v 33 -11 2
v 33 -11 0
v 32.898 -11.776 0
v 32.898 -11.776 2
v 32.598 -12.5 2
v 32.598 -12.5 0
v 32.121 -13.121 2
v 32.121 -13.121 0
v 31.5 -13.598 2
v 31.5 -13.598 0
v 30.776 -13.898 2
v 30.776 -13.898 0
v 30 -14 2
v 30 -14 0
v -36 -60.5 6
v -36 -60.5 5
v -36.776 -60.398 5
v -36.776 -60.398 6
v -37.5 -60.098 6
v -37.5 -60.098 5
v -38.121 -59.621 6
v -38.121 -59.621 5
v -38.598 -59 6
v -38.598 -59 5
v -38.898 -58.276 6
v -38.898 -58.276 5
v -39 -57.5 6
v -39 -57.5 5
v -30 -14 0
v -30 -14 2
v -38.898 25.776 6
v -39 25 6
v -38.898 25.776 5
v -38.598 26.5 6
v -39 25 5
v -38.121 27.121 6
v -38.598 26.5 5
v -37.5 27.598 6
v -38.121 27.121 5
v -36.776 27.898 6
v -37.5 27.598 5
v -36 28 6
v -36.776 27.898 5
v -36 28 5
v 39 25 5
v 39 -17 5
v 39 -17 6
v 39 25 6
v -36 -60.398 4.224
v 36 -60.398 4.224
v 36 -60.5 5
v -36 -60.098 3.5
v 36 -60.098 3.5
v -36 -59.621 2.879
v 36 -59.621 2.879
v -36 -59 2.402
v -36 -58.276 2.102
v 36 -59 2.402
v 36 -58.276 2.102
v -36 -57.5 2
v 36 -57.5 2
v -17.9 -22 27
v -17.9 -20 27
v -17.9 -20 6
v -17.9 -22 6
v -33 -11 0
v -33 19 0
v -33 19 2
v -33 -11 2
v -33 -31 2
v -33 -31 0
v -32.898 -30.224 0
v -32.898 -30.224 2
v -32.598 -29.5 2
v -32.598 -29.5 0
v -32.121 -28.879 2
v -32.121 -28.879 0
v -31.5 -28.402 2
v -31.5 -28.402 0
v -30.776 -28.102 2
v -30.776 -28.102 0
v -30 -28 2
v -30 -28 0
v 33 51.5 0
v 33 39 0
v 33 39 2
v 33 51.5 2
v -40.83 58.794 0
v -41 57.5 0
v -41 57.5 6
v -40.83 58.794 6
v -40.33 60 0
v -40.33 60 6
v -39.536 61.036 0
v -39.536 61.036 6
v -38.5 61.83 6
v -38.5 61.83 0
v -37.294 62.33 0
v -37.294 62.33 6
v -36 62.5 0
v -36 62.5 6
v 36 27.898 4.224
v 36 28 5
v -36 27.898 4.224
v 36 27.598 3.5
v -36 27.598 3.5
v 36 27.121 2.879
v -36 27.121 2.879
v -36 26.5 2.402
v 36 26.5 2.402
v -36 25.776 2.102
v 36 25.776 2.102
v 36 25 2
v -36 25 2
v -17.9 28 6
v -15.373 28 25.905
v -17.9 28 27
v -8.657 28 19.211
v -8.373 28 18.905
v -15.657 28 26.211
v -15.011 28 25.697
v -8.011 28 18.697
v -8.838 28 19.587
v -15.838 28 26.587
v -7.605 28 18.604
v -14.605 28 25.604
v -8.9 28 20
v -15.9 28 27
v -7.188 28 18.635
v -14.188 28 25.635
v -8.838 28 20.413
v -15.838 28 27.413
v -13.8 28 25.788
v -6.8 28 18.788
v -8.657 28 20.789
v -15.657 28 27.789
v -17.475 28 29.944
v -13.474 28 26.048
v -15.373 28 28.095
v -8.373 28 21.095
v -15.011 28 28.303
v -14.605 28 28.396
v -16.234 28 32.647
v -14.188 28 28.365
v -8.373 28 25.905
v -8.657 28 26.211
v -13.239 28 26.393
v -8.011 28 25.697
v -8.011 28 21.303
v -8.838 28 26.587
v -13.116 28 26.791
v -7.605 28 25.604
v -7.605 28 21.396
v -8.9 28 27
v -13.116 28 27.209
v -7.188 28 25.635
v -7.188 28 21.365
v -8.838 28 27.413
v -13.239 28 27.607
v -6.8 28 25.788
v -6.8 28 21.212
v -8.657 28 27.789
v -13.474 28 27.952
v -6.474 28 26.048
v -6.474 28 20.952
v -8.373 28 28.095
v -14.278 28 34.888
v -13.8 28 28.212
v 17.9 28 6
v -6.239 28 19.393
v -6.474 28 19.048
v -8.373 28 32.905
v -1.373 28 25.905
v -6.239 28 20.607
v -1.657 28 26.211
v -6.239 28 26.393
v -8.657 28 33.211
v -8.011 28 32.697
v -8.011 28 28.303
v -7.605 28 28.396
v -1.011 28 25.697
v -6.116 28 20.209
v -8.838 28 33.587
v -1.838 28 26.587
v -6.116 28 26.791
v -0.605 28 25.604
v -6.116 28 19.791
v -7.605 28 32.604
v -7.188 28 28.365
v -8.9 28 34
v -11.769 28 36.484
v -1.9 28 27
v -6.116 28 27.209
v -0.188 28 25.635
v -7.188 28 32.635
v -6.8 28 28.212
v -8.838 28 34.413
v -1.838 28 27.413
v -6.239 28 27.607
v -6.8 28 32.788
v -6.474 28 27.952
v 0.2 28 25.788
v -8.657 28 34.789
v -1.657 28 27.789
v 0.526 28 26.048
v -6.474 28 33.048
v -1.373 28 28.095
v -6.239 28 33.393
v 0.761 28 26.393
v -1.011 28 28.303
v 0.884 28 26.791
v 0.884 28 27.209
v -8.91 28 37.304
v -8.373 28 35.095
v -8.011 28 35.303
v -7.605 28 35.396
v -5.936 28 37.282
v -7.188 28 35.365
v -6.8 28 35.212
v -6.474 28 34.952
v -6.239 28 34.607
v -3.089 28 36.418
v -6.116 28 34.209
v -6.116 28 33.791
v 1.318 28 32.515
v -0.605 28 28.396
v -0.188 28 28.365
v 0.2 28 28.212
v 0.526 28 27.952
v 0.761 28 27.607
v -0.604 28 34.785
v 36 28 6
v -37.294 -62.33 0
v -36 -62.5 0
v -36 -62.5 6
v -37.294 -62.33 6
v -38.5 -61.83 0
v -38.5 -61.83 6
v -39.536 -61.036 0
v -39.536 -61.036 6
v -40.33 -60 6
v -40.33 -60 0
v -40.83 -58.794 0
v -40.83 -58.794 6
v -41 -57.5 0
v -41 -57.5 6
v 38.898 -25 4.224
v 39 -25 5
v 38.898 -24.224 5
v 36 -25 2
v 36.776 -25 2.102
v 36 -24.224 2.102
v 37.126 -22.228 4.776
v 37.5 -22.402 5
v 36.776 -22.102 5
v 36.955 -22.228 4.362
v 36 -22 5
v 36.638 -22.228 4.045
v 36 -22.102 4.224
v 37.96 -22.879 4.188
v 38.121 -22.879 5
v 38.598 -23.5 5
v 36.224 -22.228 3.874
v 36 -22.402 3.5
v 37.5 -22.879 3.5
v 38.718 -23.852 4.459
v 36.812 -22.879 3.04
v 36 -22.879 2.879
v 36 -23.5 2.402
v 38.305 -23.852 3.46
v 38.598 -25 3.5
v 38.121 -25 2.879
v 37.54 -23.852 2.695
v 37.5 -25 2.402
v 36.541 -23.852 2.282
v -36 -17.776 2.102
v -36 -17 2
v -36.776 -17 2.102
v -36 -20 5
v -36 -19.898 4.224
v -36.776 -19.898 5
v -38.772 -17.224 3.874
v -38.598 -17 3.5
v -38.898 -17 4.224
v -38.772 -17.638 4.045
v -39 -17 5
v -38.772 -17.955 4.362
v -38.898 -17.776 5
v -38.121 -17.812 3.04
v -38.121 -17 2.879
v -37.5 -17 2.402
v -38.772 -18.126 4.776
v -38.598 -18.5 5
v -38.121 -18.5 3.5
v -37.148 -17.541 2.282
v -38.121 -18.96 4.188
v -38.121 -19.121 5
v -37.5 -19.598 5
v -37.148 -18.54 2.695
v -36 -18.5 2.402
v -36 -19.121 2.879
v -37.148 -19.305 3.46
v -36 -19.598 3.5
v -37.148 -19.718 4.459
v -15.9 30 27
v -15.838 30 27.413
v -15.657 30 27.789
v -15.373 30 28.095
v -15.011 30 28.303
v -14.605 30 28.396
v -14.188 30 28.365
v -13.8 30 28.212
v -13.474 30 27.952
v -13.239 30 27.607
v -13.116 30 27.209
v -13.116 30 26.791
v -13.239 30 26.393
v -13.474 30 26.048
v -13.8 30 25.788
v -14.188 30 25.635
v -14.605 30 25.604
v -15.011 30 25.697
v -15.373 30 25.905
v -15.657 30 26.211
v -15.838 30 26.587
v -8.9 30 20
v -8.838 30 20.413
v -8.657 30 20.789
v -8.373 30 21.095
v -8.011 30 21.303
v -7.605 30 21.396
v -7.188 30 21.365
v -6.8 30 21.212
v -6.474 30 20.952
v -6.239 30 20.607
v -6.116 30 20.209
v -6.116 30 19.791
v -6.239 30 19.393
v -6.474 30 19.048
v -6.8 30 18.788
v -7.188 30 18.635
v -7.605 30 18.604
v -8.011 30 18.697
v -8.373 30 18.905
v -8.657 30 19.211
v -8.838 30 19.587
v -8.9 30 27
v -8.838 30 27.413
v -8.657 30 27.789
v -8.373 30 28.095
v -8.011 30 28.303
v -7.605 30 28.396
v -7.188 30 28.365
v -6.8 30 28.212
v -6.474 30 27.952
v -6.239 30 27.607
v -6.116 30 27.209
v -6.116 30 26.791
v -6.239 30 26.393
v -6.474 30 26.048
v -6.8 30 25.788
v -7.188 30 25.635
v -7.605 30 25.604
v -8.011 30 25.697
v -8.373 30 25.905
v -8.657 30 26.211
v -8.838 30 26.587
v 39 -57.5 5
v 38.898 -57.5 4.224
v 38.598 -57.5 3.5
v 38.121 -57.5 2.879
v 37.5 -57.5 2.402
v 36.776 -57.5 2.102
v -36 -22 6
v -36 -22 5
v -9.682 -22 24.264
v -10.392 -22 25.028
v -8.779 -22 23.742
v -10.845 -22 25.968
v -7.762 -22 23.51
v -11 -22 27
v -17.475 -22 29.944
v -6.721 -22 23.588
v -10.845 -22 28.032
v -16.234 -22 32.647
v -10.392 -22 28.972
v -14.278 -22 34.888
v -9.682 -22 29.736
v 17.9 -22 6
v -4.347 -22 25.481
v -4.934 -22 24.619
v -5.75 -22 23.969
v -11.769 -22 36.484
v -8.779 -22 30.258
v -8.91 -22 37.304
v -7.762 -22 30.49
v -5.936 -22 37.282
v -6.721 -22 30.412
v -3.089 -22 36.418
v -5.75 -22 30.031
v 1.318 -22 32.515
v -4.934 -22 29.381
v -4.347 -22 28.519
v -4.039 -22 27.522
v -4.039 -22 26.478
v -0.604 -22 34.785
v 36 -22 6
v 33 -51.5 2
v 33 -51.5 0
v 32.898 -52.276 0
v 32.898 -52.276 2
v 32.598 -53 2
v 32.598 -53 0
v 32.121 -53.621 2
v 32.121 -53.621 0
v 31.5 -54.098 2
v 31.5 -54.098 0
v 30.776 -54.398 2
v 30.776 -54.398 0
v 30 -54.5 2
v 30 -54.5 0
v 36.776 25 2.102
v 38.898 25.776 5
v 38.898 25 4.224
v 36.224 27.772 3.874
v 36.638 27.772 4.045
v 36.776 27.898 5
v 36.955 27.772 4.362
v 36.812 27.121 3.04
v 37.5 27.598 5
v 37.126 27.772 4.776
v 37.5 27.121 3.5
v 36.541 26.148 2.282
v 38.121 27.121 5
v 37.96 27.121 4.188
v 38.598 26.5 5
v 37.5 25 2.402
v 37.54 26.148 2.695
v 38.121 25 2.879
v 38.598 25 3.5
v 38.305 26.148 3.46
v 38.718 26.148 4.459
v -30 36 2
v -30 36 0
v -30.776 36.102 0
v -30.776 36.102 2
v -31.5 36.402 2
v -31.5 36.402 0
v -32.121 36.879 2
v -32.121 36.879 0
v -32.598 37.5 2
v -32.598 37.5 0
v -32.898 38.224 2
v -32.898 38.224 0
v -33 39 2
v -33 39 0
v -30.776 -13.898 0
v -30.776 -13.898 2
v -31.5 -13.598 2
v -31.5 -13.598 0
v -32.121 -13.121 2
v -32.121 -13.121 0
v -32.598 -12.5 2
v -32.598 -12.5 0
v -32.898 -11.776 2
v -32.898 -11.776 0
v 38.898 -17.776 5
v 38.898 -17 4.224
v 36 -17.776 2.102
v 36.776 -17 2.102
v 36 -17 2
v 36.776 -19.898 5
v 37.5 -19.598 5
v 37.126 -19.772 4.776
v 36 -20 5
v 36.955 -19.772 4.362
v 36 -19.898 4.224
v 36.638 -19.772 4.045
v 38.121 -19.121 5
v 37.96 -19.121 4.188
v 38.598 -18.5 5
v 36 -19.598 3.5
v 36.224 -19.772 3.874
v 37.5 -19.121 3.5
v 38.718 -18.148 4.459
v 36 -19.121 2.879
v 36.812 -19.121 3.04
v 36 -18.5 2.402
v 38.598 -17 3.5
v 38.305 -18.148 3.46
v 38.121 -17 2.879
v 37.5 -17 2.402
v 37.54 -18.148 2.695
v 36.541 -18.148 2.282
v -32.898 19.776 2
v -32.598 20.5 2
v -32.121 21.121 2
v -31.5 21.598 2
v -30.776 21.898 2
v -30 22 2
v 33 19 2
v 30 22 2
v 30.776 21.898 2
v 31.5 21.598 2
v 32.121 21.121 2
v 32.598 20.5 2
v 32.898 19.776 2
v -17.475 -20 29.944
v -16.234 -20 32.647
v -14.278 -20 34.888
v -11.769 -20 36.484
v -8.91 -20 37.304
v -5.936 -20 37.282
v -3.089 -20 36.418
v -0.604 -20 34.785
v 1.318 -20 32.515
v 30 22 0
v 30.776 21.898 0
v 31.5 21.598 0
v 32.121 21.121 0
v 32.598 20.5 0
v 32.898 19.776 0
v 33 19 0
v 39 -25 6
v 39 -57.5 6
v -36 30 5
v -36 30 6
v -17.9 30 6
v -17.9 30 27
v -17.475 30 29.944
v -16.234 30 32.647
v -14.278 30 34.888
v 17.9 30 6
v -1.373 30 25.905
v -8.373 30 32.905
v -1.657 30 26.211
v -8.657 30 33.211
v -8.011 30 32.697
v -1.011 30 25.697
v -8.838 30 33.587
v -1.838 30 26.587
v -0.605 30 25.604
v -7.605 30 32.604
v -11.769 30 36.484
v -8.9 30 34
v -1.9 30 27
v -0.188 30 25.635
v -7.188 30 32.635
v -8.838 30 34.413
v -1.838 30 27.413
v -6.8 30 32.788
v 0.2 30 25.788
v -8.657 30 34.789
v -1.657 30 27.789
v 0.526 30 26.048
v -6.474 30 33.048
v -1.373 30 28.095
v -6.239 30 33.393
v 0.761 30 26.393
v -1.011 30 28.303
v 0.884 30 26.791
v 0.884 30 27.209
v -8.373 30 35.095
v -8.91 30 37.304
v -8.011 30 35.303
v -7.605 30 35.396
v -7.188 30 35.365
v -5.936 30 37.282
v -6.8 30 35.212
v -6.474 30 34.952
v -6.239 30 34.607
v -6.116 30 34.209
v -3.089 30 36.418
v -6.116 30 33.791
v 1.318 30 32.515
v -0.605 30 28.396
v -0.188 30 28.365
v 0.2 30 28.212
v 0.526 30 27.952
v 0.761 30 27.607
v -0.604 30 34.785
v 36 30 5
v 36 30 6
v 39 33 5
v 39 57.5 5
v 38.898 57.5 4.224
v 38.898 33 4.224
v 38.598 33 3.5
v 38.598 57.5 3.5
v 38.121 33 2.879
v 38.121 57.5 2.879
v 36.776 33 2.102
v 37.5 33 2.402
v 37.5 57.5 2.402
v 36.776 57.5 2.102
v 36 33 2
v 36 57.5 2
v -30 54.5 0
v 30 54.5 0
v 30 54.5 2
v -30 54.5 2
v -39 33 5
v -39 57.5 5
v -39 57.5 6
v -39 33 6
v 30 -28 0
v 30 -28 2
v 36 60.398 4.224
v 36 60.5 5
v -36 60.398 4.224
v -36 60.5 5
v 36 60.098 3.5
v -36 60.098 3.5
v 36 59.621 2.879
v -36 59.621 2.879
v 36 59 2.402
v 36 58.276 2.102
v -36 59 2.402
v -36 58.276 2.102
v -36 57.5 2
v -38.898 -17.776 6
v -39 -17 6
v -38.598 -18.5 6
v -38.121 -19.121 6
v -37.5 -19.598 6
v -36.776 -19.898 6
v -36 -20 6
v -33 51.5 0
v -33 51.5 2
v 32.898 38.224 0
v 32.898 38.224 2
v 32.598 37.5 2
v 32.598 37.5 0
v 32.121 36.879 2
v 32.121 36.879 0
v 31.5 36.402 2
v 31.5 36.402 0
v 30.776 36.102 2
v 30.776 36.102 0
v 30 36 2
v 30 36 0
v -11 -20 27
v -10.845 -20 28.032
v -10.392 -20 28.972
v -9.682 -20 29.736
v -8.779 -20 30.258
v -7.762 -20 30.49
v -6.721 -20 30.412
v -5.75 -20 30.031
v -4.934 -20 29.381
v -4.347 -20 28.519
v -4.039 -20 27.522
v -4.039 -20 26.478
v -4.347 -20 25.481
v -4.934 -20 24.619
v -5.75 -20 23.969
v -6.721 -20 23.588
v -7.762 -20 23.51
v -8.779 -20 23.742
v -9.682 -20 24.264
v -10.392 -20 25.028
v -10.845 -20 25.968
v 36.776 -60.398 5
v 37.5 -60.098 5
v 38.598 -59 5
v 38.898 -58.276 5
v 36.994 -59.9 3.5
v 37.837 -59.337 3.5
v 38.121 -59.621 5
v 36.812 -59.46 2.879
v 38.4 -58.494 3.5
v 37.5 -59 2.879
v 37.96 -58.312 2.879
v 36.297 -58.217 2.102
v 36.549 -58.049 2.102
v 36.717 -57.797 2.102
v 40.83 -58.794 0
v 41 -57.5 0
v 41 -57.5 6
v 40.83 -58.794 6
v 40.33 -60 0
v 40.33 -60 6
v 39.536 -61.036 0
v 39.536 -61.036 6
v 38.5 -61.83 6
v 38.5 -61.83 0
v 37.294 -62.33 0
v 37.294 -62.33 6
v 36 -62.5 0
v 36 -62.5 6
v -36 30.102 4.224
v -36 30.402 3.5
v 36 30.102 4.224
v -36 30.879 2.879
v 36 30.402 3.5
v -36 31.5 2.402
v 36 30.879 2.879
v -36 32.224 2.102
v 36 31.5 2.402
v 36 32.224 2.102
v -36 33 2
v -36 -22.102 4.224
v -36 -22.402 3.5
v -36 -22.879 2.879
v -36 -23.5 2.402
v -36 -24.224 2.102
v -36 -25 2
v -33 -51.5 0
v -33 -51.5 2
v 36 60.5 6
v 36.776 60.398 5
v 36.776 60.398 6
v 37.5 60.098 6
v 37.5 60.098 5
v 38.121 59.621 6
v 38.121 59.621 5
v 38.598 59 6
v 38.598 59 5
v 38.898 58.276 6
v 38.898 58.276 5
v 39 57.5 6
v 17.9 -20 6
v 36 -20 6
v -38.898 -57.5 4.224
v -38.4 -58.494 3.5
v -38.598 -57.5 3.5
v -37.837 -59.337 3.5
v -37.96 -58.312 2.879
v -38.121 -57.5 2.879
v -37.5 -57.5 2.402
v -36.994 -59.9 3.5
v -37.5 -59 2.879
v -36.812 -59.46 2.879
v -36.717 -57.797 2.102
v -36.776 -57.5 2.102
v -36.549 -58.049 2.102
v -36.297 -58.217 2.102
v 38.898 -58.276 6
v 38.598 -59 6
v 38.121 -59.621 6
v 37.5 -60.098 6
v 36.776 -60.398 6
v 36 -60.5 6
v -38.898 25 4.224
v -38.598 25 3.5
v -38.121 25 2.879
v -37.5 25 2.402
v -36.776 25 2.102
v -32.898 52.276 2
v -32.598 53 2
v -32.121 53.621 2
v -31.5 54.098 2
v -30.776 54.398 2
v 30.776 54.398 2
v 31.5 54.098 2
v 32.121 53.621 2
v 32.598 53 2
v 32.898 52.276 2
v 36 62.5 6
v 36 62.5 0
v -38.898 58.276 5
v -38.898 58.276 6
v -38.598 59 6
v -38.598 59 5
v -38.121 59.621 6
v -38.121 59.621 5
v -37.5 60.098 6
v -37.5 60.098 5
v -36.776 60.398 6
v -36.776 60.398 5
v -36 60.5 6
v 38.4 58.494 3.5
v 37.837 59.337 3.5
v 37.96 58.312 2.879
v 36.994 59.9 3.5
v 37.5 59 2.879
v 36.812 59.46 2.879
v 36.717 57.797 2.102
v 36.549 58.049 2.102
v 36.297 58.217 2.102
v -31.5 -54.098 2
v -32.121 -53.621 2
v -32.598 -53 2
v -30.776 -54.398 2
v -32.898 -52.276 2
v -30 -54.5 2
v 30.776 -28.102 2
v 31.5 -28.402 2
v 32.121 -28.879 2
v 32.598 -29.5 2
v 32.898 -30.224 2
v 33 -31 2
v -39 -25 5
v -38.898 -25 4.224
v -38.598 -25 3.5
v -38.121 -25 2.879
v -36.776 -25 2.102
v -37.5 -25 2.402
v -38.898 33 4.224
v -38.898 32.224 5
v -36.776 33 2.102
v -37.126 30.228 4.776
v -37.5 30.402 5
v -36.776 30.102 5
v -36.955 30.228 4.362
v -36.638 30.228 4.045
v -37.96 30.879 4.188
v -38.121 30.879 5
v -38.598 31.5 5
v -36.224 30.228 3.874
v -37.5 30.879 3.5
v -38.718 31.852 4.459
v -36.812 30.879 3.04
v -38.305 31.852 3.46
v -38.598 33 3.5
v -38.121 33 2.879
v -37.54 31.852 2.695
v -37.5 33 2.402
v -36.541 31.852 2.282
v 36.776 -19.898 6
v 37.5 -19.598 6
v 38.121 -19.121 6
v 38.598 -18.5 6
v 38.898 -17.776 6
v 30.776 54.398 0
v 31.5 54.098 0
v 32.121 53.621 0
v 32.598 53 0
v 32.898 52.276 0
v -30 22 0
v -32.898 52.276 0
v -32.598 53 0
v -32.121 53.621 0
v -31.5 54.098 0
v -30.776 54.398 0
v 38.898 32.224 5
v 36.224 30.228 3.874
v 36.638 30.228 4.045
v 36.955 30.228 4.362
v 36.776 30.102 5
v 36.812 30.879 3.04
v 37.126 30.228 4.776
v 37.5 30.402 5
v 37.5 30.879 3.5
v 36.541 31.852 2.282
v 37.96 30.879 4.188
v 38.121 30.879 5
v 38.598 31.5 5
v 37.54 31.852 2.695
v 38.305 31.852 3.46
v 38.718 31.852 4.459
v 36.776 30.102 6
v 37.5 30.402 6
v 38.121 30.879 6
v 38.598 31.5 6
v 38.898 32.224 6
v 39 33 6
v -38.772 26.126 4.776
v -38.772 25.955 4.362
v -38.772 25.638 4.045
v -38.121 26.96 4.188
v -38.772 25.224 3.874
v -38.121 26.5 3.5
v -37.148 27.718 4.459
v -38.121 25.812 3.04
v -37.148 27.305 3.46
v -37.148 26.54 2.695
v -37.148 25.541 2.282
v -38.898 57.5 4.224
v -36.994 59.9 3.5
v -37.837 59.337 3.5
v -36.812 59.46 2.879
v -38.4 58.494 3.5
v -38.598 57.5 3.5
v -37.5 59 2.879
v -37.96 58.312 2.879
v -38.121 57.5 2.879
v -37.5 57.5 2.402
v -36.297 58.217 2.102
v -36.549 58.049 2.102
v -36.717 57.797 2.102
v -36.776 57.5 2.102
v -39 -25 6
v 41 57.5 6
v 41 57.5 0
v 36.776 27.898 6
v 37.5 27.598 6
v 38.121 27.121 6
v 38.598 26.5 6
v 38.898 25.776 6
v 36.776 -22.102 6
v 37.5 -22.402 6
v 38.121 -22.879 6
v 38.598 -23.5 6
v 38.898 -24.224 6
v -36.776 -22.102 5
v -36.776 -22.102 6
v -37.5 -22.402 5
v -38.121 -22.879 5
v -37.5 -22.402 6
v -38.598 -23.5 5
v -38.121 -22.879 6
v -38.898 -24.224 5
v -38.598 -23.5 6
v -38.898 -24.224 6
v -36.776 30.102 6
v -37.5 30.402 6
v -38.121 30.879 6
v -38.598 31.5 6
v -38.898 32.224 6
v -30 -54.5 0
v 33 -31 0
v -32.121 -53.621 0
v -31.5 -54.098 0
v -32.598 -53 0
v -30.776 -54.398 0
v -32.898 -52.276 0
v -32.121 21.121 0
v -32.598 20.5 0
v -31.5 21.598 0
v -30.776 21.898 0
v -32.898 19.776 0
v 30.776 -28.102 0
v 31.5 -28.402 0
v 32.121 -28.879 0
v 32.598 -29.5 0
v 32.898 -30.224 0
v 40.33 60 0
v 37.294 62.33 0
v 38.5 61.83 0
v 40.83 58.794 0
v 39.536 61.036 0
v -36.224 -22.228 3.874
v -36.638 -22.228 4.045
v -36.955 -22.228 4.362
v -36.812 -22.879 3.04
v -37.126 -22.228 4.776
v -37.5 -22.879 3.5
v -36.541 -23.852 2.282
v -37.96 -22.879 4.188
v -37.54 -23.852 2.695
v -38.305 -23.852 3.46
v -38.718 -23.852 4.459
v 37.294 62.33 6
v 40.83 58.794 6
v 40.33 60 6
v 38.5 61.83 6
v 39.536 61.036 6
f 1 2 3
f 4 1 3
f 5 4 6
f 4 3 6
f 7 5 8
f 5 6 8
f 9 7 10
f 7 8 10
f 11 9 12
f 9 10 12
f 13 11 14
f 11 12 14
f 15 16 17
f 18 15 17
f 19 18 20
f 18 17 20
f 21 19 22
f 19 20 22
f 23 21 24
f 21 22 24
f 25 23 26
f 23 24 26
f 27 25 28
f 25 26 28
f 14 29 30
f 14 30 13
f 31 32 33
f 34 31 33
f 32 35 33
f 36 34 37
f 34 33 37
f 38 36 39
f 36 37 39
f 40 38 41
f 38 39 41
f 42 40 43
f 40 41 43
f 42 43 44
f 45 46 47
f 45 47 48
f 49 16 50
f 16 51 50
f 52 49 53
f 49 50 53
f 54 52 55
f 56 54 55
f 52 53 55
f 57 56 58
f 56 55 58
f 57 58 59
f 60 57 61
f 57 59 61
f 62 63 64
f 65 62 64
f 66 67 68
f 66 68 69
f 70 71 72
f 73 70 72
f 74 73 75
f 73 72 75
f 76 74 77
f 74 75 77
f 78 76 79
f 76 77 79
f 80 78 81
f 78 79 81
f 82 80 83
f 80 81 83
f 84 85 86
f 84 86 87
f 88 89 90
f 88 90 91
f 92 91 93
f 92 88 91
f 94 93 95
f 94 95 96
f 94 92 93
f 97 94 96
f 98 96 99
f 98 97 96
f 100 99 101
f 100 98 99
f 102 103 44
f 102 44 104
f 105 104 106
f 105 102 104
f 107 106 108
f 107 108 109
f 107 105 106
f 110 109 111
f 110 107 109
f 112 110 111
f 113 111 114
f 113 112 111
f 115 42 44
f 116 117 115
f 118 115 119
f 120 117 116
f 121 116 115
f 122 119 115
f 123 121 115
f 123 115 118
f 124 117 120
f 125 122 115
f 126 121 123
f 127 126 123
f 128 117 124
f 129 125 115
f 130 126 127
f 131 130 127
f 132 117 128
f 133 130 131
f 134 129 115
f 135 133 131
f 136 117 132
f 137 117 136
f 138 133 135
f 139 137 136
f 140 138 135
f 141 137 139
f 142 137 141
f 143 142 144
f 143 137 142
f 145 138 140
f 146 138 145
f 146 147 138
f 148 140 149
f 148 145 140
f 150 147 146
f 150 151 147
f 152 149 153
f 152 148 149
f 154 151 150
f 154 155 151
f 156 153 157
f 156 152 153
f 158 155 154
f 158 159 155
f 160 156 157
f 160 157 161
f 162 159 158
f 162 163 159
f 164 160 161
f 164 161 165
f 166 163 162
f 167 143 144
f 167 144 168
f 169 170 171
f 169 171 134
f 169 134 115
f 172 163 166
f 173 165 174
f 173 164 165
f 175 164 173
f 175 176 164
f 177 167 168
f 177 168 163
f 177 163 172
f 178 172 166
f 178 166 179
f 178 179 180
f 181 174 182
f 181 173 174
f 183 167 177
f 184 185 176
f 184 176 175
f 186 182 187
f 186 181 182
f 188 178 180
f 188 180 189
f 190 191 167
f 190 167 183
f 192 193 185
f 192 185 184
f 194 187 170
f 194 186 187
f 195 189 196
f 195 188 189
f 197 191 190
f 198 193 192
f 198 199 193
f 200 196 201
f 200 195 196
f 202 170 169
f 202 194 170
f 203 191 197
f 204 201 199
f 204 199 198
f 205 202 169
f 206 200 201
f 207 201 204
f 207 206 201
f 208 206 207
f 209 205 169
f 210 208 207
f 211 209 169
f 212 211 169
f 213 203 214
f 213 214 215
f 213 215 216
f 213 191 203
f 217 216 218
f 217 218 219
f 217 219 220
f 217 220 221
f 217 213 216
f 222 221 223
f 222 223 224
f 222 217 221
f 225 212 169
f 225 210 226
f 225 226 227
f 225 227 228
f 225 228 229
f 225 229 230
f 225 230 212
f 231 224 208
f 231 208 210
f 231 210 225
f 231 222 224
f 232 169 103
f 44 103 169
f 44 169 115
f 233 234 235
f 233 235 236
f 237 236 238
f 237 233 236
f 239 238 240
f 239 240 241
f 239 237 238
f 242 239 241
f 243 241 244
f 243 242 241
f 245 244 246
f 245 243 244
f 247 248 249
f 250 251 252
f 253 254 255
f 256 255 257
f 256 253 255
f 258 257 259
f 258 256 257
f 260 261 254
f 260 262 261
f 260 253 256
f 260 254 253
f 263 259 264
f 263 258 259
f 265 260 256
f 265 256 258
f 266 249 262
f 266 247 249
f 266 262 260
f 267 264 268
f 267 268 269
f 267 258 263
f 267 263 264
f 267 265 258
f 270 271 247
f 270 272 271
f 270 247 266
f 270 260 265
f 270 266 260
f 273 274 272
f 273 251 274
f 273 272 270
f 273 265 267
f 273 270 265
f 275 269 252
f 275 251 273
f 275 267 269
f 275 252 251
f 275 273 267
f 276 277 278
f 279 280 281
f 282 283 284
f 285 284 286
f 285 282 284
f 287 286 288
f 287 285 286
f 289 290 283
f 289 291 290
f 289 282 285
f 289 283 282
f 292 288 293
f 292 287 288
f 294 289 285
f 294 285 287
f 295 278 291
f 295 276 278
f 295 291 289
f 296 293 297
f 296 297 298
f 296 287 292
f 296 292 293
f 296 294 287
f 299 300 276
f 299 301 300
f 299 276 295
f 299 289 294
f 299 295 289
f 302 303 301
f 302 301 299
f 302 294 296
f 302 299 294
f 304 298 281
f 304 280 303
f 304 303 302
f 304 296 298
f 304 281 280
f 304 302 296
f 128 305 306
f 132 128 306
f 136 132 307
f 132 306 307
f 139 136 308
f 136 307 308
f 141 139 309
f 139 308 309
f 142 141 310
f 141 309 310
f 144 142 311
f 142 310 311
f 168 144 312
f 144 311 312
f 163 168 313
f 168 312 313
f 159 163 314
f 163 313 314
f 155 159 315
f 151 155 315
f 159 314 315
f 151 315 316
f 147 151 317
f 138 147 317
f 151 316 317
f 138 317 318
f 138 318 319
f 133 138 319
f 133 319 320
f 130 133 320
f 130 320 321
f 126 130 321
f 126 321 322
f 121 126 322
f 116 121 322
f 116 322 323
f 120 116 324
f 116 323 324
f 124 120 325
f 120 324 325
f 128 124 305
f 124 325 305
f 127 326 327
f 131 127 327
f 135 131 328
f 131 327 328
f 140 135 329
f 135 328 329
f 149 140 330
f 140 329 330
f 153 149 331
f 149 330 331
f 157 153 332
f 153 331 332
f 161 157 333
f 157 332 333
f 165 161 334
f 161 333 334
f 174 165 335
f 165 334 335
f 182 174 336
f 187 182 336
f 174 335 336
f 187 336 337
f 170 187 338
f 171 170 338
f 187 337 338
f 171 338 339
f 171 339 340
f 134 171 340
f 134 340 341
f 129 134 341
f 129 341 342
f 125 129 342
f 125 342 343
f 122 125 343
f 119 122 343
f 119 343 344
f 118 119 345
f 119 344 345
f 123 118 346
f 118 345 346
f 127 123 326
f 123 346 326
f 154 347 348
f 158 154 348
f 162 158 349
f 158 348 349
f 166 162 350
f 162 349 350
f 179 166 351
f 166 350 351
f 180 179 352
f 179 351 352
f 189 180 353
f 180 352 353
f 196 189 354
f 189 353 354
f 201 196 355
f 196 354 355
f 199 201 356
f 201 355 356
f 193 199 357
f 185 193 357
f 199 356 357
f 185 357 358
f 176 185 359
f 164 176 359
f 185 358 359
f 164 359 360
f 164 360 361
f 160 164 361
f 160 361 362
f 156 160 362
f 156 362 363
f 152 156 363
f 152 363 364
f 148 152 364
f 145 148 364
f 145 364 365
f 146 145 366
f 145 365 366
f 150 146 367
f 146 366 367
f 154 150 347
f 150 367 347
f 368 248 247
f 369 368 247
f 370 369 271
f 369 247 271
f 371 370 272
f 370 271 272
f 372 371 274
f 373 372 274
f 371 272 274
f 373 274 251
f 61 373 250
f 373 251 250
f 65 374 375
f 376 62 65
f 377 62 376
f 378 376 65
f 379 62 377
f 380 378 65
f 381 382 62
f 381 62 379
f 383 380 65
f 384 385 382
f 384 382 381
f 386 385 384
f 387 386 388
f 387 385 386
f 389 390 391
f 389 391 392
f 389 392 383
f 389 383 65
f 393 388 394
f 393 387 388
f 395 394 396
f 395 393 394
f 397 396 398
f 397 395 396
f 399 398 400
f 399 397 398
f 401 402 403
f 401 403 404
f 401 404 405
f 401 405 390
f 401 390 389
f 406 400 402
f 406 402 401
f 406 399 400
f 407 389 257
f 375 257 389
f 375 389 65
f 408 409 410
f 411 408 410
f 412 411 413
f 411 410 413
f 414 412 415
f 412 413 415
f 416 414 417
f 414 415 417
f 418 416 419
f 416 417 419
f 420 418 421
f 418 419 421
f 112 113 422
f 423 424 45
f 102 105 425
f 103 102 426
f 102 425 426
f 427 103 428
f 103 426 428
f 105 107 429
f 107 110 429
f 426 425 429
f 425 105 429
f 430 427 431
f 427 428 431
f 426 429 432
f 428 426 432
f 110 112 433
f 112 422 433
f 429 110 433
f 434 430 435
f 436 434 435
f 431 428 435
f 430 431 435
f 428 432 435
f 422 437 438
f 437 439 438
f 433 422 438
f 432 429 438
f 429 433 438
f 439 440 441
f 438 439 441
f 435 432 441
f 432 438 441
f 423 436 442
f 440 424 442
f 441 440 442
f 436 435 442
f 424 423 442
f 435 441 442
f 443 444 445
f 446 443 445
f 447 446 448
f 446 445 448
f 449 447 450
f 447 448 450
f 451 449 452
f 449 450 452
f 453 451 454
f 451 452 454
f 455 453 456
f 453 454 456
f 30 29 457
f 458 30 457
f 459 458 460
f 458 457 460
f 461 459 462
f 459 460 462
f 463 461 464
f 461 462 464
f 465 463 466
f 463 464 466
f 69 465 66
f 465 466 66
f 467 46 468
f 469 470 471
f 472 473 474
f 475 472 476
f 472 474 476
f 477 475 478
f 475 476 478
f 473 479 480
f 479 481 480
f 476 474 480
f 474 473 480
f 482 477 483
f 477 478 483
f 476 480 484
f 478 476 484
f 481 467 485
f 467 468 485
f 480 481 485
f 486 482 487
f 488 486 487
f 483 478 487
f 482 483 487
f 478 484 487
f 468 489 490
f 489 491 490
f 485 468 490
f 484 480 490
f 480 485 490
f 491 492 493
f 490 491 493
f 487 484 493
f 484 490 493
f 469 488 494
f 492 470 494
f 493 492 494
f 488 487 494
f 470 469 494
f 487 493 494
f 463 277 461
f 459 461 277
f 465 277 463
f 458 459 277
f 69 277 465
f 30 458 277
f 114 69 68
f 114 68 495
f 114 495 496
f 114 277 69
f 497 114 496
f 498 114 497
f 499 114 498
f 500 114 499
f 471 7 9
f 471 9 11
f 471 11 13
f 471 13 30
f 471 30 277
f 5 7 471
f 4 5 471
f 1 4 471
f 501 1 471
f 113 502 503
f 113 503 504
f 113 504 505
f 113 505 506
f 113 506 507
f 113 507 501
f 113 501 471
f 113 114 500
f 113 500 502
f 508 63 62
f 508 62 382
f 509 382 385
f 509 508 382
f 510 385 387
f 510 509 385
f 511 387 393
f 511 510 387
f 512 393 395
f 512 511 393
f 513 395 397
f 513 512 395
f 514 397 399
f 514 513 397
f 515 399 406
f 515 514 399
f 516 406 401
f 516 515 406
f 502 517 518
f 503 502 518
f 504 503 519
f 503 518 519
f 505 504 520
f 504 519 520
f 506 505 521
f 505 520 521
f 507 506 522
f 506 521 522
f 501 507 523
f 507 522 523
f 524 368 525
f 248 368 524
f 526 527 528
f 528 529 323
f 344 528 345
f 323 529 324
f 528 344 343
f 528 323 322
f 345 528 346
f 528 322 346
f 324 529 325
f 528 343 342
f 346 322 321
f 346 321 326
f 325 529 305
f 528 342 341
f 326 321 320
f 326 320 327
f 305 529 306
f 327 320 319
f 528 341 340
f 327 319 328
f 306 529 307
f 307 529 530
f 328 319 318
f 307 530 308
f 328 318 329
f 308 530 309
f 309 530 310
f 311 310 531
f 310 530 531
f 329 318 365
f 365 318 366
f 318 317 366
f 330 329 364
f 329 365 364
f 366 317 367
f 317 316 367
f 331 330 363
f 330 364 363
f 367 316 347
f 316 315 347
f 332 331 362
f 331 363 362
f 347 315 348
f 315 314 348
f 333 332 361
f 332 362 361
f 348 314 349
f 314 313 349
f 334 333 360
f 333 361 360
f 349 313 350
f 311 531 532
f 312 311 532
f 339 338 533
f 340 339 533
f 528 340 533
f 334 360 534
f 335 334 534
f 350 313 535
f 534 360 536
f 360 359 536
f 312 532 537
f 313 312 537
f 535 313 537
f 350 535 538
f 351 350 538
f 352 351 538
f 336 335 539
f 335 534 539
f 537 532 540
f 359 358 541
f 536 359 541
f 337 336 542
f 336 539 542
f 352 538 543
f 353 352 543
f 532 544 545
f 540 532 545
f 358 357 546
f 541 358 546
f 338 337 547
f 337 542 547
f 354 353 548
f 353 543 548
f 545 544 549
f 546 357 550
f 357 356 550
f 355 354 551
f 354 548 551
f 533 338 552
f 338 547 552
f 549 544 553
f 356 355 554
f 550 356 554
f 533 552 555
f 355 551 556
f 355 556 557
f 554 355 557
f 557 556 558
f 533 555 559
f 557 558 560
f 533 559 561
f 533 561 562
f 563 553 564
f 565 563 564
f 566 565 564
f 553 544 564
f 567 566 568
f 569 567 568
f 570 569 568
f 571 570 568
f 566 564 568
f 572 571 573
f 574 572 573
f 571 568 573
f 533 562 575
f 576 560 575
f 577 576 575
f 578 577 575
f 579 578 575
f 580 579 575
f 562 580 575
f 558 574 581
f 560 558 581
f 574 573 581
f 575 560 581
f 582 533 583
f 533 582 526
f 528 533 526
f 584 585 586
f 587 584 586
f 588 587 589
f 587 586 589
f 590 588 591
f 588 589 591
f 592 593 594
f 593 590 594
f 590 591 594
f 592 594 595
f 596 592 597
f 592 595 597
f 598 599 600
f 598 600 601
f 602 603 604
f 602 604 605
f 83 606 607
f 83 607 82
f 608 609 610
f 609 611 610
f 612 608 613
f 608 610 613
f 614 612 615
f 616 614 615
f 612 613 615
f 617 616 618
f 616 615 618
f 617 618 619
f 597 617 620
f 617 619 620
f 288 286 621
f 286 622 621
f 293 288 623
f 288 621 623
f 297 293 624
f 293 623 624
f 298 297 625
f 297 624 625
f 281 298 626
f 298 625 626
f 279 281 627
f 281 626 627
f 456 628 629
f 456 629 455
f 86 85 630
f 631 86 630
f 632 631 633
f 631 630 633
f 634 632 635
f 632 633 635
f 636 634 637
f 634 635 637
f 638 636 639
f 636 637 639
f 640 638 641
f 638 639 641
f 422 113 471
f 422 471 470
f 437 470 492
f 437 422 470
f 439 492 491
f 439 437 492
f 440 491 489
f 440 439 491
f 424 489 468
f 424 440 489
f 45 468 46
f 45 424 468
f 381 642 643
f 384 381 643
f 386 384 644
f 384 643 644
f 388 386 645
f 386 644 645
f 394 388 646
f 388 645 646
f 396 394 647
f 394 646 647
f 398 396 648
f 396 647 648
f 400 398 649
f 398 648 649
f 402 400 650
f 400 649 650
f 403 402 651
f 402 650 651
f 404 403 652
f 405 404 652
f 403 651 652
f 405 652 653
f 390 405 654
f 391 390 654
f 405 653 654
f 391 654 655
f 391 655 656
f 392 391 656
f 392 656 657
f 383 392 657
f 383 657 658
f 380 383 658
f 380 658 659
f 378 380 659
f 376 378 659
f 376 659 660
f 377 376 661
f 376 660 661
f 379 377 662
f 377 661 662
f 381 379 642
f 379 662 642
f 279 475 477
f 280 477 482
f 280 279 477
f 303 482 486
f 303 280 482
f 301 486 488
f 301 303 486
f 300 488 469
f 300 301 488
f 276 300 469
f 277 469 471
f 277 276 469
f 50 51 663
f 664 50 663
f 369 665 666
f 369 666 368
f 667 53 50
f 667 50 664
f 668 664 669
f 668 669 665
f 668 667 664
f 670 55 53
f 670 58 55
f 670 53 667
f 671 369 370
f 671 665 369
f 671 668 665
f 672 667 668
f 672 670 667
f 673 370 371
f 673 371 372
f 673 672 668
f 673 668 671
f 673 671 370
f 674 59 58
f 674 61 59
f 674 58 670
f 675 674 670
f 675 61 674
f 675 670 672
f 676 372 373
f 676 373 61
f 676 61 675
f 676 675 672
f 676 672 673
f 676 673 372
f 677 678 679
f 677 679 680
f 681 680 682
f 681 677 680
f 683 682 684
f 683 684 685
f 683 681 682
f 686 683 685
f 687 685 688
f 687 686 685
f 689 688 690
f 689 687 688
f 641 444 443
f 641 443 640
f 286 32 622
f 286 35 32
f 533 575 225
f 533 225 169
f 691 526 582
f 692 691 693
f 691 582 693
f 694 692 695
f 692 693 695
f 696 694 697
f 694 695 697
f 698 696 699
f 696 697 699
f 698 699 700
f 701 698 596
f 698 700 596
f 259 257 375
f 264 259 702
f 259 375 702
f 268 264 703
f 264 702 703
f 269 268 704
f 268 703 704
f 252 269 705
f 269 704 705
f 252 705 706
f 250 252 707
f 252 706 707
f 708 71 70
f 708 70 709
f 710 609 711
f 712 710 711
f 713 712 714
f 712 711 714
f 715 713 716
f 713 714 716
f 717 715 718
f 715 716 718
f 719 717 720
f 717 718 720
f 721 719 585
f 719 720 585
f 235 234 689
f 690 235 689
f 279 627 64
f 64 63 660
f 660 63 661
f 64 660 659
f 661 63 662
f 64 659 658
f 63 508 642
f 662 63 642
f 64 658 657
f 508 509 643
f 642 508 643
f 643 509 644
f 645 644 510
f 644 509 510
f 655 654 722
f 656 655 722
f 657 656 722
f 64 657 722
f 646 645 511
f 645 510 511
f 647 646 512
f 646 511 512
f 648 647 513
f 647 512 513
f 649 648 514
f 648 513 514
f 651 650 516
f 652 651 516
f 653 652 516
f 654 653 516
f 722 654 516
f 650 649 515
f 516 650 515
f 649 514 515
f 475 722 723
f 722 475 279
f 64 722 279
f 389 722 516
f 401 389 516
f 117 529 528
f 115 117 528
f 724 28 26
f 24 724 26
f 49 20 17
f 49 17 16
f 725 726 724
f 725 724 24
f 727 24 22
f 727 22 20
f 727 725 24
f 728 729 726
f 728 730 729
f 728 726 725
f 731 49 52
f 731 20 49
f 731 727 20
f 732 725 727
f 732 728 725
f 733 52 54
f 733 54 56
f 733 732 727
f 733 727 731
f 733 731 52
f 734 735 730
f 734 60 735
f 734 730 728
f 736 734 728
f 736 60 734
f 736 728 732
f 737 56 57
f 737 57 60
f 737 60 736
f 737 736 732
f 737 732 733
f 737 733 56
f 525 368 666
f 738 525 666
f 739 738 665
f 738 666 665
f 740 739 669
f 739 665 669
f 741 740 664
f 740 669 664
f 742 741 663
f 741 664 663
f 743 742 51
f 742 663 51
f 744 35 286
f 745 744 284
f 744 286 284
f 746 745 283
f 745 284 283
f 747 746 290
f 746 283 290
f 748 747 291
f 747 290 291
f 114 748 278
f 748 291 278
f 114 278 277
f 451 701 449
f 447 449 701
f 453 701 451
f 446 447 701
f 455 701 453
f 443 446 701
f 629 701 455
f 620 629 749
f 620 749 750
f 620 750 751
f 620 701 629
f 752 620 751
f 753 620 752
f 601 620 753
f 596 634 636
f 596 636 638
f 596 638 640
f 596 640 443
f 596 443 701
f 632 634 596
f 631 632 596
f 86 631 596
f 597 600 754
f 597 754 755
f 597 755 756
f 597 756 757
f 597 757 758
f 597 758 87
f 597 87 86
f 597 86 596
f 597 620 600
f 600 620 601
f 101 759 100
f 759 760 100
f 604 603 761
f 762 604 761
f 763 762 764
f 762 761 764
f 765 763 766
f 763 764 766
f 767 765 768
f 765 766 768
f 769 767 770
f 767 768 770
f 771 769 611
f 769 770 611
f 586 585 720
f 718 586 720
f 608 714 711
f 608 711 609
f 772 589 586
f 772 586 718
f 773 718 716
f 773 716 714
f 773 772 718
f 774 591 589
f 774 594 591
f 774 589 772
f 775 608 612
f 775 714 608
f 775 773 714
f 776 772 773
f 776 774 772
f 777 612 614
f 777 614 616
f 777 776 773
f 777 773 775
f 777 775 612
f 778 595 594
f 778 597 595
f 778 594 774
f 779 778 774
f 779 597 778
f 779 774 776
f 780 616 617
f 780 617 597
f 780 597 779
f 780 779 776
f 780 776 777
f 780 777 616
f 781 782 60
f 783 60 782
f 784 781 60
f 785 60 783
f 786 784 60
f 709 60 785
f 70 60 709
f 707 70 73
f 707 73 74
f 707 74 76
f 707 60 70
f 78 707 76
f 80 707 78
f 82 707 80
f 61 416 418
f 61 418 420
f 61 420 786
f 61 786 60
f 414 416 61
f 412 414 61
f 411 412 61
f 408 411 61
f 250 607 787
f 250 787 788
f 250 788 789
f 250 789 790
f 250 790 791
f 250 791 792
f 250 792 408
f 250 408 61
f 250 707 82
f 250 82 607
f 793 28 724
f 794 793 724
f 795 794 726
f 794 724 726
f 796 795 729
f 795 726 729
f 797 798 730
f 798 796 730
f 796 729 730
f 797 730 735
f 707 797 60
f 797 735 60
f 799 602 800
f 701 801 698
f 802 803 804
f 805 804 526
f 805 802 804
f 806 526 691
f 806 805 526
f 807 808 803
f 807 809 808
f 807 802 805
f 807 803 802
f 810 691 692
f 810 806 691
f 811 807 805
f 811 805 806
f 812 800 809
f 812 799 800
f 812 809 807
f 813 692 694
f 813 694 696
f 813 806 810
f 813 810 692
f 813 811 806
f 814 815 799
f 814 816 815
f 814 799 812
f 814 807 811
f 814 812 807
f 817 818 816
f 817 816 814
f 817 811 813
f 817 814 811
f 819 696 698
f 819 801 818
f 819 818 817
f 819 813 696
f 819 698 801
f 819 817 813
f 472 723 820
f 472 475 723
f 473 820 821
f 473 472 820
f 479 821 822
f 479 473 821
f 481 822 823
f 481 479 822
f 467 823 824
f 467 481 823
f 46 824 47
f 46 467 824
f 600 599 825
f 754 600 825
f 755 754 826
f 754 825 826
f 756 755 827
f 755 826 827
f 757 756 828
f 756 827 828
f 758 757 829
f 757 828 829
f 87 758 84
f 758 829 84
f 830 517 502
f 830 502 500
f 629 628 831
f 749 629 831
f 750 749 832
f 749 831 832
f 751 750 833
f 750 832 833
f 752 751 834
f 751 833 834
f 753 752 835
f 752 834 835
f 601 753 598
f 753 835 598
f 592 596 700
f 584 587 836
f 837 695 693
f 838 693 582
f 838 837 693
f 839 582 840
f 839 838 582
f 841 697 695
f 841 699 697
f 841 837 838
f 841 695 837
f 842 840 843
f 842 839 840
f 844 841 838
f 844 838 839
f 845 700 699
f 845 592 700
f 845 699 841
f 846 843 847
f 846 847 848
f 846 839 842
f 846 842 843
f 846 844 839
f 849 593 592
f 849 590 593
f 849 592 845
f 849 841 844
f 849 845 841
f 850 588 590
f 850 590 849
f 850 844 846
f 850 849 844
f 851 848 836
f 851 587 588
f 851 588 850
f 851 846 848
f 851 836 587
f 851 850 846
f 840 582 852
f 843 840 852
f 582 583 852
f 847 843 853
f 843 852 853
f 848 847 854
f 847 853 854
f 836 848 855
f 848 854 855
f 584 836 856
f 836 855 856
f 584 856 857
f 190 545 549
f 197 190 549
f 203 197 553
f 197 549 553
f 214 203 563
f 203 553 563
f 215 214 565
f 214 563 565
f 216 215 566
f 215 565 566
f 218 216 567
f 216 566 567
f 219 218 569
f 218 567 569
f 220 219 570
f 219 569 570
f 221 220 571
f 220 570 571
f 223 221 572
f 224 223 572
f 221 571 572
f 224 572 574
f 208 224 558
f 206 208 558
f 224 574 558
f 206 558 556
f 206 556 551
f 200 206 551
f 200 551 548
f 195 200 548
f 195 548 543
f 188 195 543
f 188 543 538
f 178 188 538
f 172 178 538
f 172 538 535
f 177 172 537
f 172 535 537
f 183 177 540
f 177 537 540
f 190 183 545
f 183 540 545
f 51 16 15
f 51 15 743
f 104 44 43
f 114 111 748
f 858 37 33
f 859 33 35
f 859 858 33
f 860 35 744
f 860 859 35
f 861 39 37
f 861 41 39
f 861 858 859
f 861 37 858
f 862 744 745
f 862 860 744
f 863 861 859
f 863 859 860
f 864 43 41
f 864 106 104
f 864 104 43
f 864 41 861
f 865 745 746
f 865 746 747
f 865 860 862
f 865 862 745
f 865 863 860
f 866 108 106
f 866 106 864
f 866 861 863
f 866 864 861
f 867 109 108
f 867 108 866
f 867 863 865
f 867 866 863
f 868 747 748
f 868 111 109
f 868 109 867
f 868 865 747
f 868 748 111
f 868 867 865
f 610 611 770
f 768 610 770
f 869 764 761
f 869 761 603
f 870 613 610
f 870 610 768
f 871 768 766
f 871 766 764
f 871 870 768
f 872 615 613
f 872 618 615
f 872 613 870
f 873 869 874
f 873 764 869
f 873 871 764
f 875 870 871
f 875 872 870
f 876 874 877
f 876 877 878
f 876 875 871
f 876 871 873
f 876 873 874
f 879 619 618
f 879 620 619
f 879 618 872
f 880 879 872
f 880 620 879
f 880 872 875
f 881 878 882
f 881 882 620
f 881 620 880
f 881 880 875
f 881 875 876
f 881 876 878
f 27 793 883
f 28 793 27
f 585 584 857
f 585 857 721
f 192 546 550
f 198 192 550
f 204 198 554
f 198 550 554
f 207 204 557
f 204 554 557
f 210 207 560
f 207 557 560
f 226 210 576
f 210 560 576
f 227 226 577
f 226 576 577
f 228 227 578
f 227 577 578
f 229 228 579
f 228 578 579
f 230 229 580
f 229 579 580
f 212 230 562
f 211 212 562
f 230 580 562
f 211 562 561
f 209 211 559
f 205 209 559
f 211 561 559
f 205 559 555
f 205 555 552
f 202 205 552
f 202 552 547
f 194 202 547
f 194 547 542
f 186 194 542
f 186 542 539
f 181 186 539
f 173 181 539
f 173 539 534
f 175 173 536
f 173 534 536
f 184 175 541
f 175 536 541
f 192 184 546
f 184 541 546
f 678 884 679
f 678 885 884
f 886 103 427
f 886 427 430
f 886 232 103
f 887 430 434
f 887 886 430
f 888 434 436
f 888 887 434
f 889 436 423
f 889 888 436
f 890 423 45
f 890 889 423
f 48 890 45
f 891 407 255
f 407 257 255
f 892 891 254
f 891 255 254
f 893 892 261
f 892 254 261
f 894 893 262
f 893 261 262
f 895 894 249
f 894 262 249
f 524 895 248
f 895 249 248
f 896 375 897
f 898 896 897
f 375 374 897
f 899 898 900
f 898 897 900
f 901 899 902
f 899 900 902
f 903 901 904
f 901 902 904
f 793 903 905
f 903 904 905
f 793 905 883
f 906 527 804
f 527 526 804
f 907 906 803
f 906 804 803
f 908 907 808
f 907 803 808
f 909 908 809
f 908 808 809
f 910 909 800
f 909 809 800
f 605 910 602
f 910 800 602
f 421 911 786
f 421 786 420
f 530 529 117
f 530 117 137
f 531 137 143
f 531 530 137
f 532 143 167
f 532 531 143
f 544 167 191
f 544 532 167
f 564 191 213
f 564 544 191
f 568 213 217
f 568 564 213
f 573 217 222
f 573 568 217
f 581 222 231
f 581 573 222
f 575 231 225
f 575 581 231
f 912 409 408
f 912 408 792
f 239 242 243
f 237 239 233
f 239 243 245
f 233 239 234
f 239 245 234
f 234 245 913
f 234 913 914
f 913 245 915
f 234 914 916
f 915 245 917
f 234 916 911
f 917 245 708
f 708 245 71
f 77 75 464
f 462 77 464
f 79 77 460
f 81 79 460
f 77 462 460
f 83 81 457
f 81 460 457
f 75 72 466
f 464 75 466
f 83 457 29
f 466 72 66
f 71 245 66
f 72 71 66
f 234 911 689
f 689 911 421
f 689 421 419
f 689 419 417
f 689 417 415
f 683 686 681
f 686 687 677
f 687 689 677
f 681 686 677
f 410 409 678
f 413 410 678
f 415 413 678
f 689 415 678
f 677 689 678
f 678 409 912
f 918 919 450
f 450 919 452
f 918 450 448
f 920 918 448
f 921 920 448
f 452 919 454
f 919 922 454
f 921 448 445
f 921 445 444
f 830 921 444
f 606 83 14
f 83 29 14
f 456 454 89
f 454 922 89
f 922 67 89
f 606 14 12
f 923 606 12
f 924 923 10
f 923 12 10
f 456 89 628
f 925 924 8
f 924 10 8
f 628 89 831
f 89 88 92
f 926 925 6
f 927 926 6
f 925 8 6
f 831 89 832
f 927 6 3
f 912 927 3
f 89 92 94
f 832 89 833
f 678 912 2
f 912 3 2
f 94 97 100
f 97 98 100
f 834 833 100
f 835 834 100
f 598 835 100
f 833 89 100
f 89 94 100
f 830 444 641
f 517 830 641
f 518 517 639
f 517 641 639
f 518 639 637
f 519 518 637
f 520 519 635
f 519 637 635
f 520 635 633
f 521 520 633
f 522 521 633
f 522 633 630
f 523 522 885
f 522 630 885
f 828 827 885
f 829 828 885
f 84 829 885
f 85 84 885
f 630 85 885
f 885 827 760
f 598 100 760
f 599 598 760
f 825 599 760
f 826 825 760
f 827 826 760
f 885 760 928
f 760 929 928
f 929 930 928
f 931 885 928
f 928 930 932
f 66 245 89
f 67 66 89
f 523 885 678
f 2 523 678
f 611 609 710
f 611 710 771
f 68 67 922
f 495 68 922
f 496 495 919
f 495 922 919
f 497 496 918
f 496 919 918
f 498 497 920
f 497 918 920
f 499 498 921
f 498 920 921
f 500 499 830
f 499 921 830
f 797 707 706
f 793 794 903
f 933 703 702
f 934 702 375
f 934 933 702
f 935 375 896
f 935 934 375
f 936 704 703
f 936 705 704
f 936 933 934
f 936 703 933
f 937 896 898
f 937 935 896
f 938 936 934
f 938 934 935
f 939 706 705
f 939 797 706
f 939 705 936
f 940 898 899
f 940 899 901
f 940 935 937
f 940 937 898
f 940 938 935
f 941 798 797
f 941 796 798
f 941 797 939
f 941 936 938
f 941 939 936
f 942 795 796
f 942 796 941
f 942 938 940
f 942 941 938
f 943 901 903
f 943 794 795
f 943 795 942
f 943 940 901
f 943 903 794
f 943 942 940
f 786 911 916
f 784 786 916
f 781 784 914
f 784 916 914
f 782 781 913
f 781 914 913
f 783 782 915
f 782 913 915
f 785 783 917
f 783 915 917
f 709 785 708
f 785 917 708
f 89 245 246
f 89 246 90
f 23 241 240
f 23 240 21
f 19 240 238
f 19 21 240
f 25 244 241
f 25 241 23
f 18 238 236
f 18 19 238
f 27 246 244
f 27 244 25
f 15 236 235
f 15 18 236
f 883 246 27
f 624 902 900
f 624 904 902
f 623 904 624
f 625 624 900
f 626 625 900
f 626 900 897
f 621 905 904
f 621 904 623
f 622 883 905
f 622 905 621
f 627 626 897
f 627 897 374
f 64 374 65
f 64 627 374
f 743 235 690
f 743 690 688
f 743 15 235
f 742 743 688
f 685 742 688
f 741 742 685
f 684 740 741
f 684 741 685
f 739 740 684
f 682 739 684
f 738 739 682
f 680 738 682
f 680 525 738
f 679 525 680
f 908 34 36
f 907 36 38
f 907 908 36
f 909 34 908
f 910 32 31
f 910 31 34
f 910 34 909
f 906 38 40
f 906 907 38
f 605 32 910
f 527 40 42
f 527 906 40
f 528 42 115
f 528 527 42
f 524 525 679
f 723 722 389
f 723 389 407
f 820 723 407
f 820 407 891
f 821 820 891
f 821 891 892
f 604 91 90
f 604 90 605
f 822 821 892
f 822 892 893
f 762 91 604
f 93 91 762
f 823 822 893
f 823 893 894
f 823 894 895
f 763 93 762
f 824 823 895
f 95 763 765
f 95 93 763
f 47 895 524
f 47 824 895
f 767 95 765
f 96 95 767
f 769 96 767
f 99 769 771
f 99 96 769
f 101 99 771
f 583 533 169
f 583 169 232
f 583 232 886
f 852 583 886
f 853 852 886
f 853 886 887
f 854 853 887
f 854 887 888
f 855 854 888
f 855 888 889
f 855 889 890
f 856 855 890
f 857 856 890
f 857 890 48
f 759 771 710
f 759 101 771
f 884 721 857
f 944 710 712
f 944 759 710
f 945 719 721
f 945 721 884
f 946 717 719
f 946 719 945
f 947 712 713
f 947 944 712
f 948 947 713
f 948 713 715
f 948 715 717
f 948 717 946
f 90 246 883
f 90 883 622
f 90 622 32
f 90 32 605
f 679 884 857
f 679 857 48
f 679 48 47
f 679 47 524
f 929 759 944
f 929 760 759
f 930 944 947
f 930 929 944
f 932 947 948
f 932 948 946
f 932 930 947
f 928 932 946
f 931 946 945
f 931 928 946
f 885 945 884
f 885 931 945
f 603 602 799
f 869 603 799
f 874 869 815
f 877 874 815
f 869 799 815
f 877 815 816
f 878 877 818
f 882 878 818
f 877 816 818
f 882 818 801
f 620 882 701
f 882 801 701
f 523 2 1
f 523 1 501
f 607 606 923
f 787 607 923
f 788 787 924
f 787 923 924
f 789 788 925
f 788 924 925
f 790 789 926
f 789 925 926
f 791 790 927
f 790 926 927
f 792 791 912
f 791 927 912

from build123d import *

# Parameters (mm, degrees)
PAD_DEPTH    = 2
SKETCH001_R  = 3.5
PAD001_DEPTH = 2
SKETCH003_R  = 1.4
PAD003_DEPTH = 2
PAD004_DEPTH = 4
FILLET_R     = 3
FILLET001_R  = 3
FILLET002_R  = 3
FILLET003_R  = 3
FILLET004_R  = 3
FILLET005_R  = 3
FILLET006_R  = 3
FILLET007_R  = 3


with BuildPart() as body:
    # Sketch → Pad (new body)
    with BuildSketch(Plane.XY):
        with BuildLine():
            Line((-36, 62.5), (36, 62.5))
            ThreePointArc((41, 57.5), (39.535534, 61.035534), (36, 62.5))
            Line((41, 57.5), (41, -57.5))
            ThreePointArc((36, -62.5), (39.535534, -61.035534), (41, -57.5))
            Line((36, -62.5), (-36, -62.5))
            ThreePointArc((-41, -57.5), (-39.535534, -61.035534), (-36, -62.5))
            Line((-41, -57.5), (-41, 57.5))
            ThreePointArc((-36, 62.5), (-39.535534, 61.035534), (-41, 57.5))
        make_face()
        with BuildLine():
            ThreePointArc((-30, 54.5), (-32.12132, 53.62132), (-33, 51.5))
            Line((-33, 39), (-33, 51.5))
            ThreePointArc((-33, 39), (-32.12132, 36.87868), (-30, 36))
            Line((30, 36), (-30, 36))
            ThreePointArc((30, 36), (32.12132, 36.87868), (33, 39))
            Line((33, 51.5), (33, 39))
            ThreePointArc((33, 51.5), (32.12132, 53.62132), (30, 54.5))
            Line((-30, 54.5), (30, 54.5))
        make_face(mode=Mode.SUBTRACT)
        with BuildLine():
            ThreePointArc((-30, -28), (-32.12132, -28.87868), (-33, -31))
            Line((-33, -51.5), (-33, -31))
            ThreePointArc((-33, -51.5), (-32.12132, -53.62132), (-30, -54.5))
            Line((30, -54.5), (-30, -54.5))
            ThreePointArc((30, -54.5), (32.12132, -53.62132), (33, -51.5))
            Line((33, -31), (33, -51.5))
            ThreePointArc((33, -31), (32.12132, -28.87868), (30, -28))
            Line((-30, -28), (30, -28))
        make_face(mode=Mode.SUBTRACT)
        with BuildLine():
            ThreePointArc((-30, 22), (-32.12132, 21.12132), (-33, 19))
            Line((-33, -11), (-33, 19))
            ThreePointArc((-33, -11), (-32.12132, -13.12132), (-30, -14))
            Line((30, -14), (-30, -14))
            ThreePointArc((30, -14), (32.12132, -13.12132), (33, -11))
            Line((33, 19), (33, -11))
            ThreePointArc((33, 19), (32.12132, 21.12132), (30, 22))
            Line((-30, 22), (30, 22))
        make_face(mode=Mode.SUBTRACT)
    extrude(amount=PAD_DEPTH)

    # Sketch001 → Pad001 (join)
    with BuildSketch(Plane(origin=(7.5, -20, 0), x_dir=(1, 0, 0), z_dir=(0, -1, 0))):
        with BuildLine():
            Line((10.4, 27), (10.4, 6))
            Line((33.5, 6), (10.4, 6))
            Line((33.5, 2), (33.5, 6))
            Line((-48.5, 2), (33.5, 2))
            Line((-48.5, 6), (-48.5, 2))
            Line((-25.4, 6), (-48.5, 6))
            Line((-25.4, 6), (-8.817564, 32.514577))
            ThreePointArc((10.4, 27), (2.868565, 36.996566), (-8.817564, 32.514577))
        make_face()
        with Locations((0, 27)):
            Circle(SKETCH001_R, mode=Mode.SUBTRACT)
    extrude(amount=PAD001_DEPTH)

    # Sketch003 → Pad003 (join)
    with BuildSketch(Plane(origin=(7.5, 30, 0), x_dir=(1, 0, 0), z_dir=(0, -1, 0))):
        with BuildLine():
            Line((33.5, 2), (-48.5, 2))
            Line((-48.5, 6), (-48.5, 2))
            Line((-25.4, 6), (-48.5, 6))
            Line((-8.817564, 32.514577), (-25.4, 6))
            ThreePointArc((10.4, 27), (2.868565, 36.996566), (-8.817564, 32.514577))
            Line((10.4, 27), (10.4, 6))
            Line((10.4, 6), (33.5, 6))
            Line((33.5, 6), (33.5, 2))
        make_face()
        with Locations((0, 27)):
            Circle(SKETCH003_R, mode=Mode.SUBTRACT)
        with Locations((-7, 27)):
            Circle(SKETCH003_R, mode=Mode.SUBTRACT)
        with Locations((0, 20)):
            Circle(SKETCH003_R, mode=Mode.SUBTRACT)
        with Locations((7, 27)):
            Circle(SKETCH003_R, mode=Mode.SUBTRACT)
        with Locations((0, 34)):
            Circle(SKETCH003_R, mode=Mode.SUBTRACT)
    extrude(amount=PAD003_DEPTH)

    # Sketch004 (on Face5 of Pad003) → Pad004 (join)
    with BuildSketch(Plane.XY.offset(2)):
        with BuildLine():
            Line((-36, 62.5), (36, 62.5))
            ThreePointArc((41, 57.5), (39.535534, 61.035534), (36, 62.5))
            Line((41, -57.5), (41, 57.5))
            ThreePointArc((36, -62.5), (39.535534, -61.035534), (41, -57.5))
            Line((-36, -62.5), (36, -62.5))
            ThreePointArc((-41, -57.5), (-39.535534, -61.035534), (-36, -62.5))
            Line((-41, 57.5), (-41, -57.5))
            ThreePointArc((-36, 62.5), (-39.535534, 61.035534), (-41, 57.5))
        make_face()
        with BuildLine():
            Line((-36, 60.5), (36, 60.5))
            ThreePointArc((39, 57.5), (38.12132, 59.62132), (36, 60.5))
            Line((39, 57.5), (39, -57.5))
            ThreePointArc((36, -60.5), (38.12132, -59.62132), (39, -57.5))
            Line((36, -60.5), (-36, -60.5))
            ThreePointArc((-39, -57.5), (-38.12132, -59.62132), (-36, -60.5))
            Line((-39, -57.5), (-39, 57.5))
            ThreePointArc((-36, 60.5), (-38.12132, 59.62132), (-39, 57.5))
        make_face(mode=Mode.SUBTRACT)
    extrude(amount=PAD004_DEPTH)

    # Fillet
    fillet_edges = [body.edges().sort_by_distance(p)[0] for p in [
        (-39, 4, 2),
    ]]
    fillet(fillet_edges, radius=FILLET_R)

    # Fillet001
    fillet001_edges = [body.edges().sort_by_distance(p)[0] for p in [
        (-39, -39.75, 2),
    ]]
    fillet(fillet001_edges, radius=FILLET001_R)

    # Fillet002
    fillet002_edges = [body.edges().sort_by_distance(p)[0] for p in [
        (0, -22, 2),
    ]]
    fillet(fillet002_edges, radius=FILLET002_R)

    # Fillet003
    fillet003_edges = [body.edges().sort_by_distance(p)[0] for p in [
        (1.5, 28, 2),
    ]]
    fillet(fillet003_edges, radius=FILLET003_R)

    # Fillet004
    fillet004_edges = [body.edges().sort_by_distance(p)[0] for p in [
        (1.5, -20, 2),
    ]]
    fillet(fillet004_edges, radius=FILLET004_R)

    # Fillet005
    fillet005_edges = [body.edges().sort_by_distance(p)[0] for p in [
        (39, 4, 2),
    ]]
    fillet(fillet005_edges, radius=FILLET005_R)

    # Fillet006
    fillet006_edges = [body.edges().sort_by_distance(p)[0] for p in [
        (0, 60.5, 2),
    ]]
    fillet(fillet006_edges, radius=FILLET006_R)

    # Fillet007
    fillet007_edges = [body.edges().sort_by_distance(p)[0] for p in [
        (0, 30, 2),
    ]]
    fillet(fillet007_edges, radius=FILLET007_R)


with BuildPart() as part_mirroring:
    # Part__Mirroring: instance of Body
    add(body.part.mirror(Plane(origin=(0, 0, 0), x_dir=(0, -1, 0), z_dir=(1, 0, 0))))


solid = part_mirroring.part
